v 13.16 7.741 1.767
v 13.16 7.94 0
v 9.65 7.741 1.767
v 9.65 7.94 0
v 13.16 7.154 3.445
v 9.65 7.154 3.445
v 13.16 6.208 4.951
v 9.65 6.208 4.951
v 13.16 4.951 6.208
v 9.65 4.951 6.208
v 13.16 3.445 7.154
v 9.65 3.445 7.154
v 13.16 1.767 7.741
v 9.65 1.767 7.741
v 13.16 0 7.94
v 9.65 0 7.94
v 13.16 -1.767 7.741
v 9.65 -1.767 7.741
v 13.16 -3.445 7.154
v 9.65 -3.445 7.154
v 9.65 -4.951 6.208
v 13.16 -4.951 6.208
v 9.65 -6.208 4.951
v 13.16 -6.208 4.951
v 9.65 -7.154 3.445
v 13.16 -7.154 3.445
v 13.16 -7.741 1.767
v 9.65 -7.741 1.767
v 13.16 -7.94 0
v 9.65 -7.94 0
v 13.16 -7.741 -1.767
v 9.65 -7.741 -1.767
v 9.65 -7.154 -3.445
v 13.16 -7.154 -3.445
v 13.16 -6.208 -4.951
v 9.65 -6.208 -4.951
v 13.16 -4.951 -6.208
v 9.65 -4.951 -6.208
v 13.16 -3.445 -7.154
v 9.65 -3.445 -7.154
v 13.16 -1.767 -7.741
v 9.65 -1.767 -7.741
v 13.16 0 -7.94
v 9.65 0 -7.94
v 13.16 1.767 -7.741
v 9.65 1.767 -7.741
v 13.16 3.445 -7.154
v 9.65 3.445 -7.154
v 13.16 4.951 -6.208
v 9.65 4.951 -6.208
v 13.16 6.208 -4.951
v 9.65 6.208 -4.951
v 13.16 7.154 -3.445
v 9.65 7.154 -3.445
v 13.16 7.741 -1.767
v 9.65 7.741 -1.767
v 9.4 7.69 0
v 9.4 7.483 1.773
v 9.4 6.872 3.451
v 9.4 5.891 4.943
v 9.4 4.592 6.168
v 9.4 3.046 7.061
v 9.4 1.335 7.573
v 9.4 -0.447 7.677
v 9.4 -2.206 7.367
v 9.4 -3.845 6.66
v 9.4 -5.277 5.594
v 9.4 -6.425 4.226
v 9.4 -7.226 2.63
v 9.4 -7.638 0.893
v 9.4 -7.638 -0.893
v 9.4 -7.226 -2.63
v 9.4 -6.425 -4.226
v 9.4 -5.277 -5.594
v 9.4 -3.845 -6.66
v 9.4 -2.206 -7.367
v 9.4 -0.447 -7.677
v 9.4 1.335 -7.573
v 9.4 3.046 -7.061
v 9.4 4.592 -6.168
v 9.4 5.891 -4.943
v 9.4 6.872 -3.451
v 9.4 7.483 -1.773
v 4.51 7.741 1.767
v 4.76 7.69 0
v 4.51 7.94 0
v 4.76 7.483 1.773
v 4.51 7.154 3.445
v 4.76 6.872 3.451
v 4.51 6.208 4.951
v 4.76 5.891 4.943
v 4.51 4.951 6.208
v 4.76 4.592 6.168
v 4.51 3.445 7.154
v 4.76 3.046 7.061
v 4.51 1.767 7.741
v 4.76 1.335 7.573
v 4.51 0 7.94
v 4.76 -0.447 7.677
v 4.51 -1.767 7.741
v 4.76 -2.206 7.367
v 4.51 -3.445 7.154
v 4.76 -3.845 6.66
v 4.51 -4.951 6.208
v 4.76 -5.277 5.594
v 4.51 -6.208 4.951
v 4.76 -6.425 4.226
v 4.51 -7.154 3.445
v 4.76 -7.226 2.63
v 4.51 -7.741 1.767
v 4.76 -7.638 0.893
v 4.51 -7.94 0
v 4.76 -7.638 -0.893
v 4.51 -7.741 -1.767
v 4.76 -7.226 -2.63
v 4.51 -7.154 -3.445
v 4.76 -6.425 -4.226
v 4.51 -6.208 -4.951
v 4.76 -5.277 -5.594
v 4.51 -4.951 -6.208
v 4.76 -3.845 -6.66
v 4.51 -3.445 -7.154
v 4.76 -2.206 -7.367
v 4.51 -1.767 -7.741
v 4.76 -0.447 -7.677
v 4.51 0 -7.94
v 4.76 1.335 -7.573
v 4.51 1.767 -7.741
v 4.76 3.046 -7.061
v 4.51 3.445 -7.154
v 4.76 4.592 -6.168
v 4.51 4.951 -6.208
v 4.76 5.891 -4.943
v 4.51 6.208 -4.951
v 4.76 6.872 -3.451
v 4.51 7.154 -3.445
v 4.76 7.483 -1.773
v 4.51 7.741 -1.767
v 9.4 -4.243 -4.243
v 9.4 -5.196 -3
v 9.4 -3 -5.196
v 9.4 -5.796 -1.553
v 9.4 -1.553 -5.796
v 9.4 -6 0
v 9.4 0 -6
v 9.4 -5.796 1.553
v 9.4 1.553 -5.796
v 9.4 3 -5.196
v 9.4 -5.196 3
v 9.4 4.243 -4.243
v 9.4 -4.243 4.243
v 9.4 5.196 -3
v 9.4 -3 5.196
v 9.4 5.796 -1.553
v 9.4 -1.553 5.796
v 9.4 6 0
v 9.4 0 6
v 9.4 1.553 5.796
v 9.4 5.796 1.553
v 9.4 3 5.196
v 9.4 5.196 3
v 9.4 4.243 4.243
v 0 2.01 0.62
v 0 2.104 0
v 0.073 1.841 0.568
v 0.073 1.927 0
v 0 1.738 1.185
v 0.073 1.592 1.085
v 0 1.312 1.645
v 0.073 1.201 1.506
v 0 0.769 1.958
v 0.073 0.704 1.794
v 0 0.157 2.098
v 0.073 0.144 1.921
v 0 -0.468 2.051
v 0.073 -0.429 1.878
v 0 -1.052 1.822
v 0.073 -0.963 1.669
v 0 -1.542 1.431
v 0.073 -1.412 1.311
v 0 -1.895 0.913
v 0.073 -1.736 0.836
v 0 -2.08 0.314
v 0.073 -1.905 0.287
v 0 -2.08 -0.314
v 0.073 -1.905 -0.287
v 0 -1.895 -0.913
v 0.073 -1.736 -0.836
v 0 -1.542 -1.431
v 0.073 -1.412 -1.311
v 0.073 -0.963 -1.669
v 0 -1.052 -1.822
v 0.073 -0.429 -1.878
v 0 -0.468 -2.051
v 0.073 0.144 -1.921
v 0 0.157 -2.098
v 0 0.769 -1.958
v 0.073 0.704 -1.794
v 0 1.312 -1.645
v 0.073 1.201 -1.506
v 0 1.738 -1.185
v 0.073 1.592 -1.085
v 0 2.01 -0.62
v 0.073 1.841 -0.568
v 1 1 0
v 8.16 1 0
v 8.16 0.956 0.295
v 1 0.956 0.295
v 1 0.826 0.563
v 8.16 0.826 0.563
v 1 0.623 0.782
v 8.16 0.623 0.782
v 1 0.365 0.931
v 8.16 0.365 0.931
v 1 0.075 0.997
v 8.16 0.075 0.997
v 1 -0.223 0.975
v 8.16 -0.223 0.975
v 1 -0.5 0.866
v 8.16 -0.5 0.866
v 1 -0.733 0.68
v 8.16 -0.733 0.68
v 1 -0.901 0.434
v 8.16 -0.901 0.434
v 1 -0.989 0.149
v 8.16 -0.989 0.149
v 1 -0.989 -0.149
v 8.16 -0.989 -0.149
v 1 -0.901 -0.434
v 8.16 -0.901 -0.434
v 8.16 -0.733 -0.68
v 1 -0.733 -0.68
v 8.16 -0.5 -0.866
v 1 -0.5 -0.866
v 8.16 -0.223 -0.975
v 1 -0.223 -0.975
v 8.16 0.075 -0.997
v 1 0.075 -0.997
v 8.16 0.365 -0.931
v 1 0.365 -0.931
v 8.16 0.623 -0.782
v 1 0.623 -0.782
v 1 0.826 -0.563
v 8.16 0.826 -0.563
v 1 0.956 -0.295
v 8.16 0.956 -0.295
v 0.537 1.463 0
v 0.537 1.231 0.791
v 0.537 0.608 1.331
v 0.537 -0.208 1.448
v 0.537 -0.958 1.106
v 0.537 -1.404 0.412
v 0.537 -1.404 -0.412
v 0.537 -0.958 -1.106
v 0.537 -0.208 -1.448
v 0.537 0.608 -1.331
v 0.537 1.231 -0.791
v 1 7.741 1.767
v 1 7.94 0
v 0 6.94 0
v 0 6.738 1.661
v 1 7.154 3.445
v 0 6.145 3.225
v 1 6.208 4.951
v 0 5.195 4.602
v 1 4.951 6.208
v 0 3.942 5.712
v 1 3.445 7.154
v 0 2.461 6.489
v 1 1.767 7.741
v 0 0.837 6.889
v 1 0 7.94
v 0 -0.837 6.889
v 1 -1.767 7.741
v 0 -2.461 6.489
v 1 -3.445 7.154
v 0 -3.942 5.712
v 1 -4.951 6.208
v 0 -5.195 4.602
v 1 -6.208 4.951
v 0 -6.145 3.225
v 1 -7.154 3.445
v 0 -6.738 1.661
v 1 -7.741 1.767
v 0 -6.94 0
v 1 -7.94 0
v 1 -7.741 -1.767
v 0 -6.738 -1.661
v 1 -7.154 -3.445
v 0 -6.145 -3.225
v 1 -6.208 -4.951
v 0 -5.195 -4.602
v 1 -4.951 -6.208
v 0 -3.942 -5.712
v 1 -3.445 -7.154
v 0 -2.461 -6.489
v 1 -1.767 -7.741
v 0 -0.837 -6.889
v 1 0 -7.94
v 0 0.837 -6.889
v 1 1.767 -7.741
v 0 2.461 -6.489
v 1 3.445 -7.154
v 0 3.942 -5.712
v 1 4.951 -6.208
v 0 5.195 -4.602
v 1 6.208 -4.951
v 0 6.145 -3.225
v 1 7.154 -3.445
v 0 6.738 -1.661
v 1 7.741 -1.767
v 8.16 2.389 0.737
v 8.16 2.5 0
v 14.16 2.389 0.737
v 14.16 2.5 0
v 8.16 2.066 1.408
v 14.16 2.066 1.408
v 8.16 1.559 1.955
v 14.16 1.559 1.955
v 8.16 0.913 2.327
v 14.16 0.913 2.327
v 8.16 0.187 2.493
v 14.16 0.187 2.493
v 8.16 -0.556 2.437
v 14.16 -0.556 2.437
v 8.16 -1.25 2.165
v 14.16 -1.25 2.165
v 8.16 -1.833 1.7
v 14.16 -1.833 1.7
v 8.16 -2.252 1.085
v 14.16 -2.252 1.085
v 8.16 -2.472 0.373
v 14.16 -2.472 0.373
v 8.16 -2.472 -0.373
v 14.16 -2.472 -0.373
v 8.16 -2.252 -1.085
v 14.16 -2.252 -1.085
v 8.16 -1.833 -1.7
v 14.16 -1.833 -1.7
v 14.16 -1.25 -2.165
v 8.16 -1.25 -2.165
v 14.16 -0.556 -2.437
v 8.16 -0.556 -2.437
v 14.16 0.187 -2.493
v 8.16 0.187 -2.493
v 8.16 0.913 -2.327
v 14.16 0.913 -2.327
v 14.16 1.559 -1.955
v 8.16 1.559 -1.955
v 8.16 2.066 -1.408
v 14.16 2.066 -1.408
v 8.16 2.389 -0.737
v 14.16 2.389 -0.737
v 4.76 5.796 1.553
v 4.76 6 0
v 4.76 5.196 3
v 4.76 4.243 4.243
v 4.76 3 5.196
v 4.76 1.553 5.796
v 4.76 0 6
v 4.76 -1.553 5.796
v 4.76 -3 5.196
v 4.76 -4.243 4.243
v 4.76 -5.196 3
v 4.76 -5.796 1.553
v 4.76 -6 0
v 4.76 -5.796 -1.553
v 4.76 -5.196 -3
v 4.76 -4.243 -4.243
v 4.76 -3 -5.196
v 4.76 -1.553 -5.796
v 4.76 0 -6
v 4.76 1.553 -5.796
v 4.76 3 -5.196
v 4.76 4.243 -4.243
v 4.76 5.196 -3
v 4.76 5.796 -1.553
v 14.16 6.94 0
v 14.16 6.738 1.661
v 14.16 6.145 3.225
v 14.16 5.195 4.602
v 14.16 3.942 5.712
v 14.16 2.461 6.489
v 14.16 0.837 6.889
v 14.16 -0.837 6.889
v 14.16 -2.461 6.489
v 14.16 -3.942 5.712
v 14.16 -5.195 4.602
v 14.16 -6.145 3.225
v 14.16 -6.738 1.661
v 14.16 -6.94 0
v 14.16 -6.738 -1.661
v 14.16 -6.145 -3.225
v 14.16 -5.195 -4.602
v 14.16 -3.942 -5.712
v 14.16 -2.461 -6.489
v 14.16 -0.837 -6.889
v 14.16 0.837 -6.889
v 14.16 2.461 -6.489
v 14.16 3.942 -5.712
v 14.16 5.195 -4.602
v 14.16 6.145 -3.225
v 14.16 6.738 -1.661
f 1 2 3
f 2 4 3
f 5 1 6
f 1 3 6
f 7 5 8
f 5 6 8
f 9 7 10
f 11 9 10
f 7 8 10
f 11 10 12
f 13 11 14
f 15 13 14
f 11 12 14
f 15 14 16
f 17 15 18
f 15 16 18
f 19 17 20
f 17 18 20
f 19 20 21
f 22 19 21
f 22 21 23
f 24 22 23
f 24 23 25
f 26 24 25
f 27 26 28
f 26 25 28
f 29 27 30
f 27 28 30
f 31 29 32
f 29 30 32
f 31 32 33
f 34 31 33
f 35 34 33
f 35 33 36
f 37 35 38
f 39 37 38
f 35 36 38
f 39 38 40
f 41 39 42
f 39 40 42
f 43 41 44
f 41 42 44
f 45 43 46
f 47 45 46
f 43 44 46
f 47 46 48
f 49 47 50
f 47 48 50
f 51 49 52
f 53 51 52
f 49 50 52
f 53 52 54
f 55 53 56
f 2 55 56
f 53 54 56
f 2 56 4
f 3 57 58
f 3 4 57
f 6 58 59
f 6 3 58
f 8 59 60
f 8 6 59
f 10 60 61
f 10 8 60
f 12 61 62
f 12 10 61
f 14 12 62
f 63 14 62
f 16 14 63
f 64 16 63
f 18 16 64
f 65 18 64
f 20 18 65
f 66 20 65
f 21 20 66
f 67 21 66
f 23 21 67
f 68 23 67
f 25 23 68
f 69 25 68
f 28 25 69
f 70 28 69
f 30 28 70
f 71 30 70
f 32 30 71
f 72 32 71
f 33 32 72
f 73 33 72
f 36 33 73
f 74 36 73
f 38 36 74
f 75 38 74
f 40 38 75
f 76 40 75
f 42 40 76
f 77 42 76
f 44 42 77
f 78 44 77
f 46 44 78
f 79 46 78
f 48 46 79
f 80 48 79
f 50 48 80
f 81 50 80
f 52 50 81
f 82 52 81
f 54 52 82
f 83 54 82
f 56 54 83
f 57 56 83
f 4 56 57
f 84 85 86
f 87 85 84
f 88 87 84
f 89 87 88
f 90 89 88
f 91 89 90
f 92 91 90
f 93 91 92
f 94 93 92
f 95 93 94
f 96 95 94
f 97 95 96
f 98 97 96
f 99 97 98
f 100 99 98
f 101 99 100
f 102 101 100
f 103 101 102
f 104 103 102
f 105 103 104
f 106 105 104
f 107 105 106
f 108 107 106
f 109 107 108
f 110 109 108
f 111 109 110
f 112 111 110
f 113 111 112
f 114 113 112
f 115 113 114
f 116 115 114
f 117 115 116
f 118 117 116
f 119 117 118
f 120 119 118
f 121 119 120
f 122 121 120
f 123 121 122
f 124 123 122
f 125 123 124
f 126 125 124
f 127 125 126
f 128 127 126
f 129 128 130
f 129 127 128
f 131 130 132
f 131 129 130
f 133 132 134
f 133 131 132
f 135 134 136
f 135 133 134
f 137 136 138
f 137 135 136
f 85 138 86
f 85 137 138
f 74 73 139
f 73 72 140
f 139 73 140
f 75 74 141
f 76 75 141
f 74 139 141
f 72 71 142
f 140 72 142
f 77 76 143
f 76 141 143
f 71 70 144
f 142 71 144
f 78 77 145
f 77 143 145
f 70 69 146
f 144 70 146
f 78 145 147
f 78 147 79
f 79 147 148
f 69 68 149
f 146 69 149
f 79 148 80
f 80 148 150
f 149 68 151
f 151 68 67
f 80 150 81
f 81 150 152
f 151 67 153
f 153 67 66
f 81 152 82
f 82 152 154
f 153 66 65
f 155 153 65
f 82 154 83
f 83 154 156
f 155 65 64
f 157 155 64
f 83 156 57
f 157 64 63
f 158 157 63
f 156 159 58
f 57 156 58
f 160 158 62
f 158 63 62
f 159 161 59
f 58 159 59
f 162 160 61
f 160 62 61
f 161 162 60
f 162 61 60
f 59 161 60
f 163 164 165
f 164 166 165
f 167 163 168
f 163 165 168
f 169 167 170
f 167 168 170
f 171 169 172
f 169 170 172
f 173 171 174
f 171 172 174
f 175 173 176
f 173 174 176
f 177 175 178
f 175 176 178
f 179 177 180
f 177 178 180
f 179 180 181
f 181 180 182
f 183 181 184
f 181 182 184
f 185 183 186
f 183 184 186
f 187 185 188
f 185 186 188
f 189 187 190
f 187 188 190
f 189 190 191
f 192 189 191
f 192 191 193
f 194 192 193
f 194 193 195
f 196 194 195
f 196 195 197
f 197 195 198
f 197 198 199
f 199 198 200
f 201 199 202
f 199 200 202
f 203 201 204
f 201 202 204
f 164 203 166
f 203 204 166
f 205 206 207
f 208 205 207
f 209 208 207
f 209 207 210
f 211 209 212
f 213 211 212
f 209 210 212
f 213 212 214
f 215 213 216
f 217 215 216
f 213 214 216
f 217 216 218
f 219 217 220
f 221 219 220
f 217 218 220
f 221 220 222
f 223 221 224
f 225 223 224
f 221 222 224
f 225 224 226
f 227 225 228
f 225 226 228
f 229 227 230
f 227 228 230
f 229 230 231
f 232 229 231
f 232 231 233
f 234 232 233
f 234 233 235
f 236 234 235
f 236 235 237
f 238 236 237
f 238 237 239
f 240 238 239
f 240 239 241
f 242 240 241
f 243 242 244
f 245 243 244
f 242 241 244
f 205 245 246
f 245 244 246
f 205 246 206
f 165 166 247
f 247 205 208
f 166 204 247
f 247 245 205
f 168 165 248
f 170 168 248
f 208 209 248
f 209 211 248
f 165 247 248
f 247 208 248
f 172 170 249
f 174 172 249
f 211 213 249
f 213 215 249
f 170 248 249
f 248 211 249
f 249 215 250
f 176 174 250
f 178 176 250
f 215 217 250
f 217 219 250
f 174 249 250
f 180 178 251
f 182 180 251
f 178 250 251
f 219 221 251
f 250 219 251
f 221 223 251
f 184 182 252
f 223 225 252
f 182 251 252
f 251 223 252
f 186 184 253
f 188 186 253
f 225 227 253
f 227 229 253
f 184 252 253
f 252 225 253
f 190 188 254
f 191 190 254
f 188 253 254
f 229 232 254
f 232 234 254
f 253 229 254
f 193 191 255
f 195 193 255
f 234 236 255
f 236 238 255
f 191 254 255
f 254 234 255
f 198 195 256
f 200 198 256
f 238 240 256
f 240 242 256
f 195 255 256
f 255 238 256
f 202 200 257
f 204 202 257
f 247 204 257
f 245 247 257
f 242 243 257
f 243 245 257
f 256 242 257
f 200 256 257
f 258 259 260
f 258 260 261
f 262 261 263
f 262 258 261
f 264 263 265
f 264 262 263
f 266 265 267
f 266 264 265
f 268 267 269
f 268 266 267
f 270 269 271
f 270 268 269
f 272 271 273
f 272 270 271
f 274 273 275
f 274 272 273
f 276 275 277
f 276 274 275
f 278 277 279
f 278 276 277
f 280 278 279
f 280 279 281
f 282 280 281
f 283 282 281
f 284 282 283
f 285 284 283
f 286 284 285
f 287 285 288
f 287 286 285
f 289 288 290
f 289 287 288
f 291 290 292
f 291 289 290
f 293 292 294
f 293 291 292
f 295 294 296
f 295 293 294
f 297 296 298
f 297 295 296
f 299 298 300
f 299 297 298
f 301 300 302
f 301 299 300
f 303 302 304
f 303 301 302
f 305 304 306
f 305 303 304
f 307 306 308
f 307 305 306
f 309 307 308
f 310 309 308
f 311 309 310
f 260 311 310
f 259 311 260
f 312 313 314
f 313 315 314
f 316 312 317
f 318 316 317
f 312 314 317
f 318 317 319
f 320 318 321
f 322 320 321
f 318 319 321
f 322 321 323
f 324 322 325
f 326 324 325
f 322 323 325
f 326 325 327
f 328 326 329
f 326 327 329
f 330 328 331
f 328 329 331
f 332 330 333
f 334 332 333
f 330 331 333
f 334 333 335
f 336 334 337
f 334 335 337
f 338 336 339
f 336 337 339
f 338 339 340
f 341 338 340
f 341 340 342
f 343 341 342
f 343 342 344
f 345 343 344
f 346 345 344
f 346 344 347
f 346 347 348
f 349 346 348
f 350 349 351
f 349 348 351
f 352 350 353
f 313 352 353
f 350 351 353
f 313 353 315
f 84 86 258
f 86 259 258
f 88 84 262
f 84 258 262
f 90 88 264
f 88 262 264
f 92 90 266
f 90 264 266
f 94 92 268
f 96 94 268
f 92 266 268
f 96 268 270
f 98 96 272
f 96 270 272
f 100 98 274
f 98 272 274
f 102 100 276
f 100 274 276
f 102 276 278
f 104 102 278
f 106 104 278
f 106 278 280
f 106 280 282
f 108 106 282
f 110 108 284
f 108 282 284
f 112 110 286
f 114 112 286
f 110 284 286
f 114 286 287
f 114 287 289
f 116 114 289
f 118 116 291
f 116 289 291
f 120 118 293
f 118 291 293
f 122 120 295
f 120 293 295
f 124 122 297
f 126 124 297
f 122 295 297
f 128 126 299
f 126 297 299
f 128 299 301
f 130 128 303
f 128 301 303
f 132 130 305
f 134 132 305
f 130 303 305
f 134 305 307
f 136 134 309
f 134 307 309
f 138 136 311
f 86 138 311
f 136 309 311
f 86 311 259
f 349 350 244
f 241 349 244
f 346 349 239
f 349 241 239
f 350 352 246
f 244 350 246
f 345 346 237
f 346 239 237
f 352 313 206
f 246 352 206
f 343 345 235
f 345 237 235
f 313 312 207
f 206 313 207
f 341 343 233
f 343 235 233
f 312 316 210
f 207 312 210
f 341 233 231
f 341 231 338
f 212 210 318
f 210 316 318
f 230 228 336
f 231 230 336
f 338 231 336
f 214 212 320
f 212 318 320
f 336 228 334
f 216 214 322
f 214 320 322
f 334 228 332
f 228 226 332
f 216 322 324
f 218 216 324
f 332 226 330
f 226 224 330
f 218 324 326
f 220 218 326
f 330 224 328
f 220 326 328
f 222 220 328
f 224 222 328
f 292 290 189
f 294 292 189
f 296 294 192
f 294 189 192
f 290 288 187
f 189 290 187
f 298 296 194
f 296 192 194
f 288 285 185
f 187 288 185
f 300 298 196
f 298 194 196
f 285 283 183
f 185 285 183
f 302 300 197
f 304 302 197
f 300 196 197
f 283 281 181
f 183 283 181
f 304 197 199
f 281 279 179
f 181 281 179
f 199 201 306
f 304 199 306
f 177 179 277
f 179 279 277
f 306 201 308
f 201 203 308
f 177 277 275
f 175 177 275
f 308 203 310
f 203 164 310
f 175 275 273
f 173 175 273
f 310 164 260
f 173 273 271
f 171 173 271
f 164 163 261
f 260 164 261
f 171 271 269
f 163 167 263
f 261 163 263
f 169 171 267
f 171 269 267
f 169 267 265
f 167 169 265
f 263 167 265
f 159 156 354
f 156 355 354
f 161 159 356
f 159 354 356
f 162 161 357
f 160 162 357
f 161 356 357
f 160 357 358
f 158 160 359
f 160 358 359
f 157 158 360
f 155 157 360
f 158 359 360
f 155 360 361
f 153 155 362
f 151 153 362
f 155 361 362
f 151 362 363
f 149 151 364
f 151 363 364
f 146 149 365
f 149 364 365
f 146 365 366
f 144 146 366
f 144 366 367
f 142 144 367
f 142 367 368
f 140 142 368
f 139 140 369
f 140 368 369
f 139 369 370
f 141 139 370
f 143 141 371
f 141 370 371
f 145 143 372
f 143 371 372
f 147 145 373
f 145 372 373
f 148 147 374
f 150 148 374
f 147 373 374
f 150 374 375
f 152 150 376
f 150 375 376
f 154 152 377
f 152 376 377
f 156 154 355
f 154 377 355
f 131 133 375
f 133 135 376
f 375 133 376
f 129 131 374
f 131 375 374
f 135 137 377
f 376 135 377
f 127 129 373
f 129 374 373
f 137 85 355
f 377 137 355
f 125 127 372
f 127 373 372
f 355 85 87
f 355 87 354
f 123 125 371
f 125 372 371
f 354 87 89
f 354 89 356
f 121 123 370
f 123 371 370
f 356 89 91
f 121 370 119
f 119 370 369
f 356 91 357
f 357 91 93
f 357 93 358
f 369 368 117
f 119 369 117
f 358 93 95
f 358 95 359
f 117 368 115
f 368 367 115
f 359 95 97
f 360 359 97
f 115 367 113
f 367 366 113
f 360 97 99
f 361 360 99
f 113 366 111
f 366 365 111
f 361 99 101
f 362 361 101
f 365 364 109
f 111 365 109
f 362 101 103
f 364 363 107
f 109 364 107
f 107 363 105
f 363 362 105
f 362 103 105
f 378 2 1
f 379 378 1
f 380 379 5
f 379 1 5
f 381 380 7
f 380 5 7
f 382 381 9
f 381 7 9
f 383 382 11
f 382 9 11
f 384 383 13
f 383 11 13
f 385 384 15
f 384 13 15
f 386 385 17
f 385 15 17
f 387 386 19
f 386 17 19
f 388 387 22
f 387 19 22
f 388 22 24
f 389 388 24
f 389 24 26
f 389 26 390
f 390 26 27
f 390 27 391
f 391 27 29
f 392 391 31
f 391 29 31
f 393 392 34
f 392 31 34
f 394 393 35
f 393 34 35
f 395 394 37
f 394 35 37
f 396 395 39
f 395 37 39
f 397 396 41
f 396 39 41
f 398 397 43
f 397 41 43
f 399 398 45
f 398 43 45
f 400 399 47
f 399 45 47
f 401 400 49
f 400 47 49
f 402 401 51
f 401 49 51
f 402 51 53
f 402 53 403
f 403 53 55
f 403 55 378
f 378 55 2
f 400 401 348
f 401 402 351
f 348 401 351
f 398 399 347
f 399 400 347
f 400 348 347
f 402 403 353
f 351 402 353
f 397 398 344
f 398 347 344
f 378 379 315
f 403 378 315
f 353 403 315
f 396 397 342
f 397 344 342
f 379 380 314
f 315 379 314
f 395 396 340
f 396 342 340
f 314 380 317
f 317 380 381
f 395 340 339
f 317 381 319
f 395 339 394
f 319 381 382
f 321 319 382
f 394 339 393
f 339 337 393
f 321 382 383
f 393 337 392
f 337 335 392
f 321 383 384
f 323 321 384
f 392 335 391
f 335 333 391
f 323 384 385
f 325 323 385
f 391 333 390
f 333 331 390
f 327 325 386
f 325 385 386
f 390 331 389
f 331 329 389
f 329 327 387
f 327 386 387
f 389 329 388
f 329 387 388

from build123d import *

# Parameters (mm, degrees)
F2_SIZE = 1


# Not quite as in the source:
# - a fillet or chamfer that OpenCascade refuses, or shapes differently, is made with other operations: its cross-section is extruded or revolved along the edge and cut away or added


with BuildPart() as f1:
    # F0 (on Top) → F1 (revolve)
    with BuildSketch(Plane.XY):
        Polygon((0, 7.94), (0, 1), (8.16, 1), (8.16, 2.5), (14.16, 2.5), (14.16, 7.94), (9.4, 7.94), (9.4, 6), (4.76, 6), (4.76, 7.94), align=None)
    revolve(axis=Axis((7.08, 0, 0), (1, 0, 0)))

    # F2
    f2_edges = [f1.edges().sort_by_distance(p)[0] for p in [
        (0, -7.94, 0),
        (14.16, -7.94, 0),
        (0, -1, 0),
    ]]
    chamfer(f2_edges, length=F2_SIZE)

    # F3: chamfer of 0.25 on 3 edges, made by hand

    # F3_s1 → F3_t2 (revolve, cut)
    with BuildSketch(Plane.XY):
        Polygon((4.51, 7.94), (4.76, 7.69), (4.76, 7.94), align=None)
    revolve(axis=Axis((4.76, 0, 0), (1, 0, 0)), mode=Mode.SUBTRACT)

    # F3_s3 → F3_t4 (revolve, cut)
    with BuildSketch(Plane.XY):
        Polygon((9.4, 7.69), (9.65, 7.94), (9.4, 7.94), align=None)
    revolve(axis=Axis((9.4, 0, 0), (1, 0, 0)), mode=Mode.SUBTRACT)

    # F3_s5 → F3_t6 (revolve, cut)
    with BuildSketch(Plane.XY):
        Polygon((0, 2.1035533906), (0.0732233047, 1.9267766953), (0, 2), align=None)
    revolve(axis=Axis((0, 0, 0), (1, 0, 0)), mode=Mode.SUBTRACT)


solid = f1.part
